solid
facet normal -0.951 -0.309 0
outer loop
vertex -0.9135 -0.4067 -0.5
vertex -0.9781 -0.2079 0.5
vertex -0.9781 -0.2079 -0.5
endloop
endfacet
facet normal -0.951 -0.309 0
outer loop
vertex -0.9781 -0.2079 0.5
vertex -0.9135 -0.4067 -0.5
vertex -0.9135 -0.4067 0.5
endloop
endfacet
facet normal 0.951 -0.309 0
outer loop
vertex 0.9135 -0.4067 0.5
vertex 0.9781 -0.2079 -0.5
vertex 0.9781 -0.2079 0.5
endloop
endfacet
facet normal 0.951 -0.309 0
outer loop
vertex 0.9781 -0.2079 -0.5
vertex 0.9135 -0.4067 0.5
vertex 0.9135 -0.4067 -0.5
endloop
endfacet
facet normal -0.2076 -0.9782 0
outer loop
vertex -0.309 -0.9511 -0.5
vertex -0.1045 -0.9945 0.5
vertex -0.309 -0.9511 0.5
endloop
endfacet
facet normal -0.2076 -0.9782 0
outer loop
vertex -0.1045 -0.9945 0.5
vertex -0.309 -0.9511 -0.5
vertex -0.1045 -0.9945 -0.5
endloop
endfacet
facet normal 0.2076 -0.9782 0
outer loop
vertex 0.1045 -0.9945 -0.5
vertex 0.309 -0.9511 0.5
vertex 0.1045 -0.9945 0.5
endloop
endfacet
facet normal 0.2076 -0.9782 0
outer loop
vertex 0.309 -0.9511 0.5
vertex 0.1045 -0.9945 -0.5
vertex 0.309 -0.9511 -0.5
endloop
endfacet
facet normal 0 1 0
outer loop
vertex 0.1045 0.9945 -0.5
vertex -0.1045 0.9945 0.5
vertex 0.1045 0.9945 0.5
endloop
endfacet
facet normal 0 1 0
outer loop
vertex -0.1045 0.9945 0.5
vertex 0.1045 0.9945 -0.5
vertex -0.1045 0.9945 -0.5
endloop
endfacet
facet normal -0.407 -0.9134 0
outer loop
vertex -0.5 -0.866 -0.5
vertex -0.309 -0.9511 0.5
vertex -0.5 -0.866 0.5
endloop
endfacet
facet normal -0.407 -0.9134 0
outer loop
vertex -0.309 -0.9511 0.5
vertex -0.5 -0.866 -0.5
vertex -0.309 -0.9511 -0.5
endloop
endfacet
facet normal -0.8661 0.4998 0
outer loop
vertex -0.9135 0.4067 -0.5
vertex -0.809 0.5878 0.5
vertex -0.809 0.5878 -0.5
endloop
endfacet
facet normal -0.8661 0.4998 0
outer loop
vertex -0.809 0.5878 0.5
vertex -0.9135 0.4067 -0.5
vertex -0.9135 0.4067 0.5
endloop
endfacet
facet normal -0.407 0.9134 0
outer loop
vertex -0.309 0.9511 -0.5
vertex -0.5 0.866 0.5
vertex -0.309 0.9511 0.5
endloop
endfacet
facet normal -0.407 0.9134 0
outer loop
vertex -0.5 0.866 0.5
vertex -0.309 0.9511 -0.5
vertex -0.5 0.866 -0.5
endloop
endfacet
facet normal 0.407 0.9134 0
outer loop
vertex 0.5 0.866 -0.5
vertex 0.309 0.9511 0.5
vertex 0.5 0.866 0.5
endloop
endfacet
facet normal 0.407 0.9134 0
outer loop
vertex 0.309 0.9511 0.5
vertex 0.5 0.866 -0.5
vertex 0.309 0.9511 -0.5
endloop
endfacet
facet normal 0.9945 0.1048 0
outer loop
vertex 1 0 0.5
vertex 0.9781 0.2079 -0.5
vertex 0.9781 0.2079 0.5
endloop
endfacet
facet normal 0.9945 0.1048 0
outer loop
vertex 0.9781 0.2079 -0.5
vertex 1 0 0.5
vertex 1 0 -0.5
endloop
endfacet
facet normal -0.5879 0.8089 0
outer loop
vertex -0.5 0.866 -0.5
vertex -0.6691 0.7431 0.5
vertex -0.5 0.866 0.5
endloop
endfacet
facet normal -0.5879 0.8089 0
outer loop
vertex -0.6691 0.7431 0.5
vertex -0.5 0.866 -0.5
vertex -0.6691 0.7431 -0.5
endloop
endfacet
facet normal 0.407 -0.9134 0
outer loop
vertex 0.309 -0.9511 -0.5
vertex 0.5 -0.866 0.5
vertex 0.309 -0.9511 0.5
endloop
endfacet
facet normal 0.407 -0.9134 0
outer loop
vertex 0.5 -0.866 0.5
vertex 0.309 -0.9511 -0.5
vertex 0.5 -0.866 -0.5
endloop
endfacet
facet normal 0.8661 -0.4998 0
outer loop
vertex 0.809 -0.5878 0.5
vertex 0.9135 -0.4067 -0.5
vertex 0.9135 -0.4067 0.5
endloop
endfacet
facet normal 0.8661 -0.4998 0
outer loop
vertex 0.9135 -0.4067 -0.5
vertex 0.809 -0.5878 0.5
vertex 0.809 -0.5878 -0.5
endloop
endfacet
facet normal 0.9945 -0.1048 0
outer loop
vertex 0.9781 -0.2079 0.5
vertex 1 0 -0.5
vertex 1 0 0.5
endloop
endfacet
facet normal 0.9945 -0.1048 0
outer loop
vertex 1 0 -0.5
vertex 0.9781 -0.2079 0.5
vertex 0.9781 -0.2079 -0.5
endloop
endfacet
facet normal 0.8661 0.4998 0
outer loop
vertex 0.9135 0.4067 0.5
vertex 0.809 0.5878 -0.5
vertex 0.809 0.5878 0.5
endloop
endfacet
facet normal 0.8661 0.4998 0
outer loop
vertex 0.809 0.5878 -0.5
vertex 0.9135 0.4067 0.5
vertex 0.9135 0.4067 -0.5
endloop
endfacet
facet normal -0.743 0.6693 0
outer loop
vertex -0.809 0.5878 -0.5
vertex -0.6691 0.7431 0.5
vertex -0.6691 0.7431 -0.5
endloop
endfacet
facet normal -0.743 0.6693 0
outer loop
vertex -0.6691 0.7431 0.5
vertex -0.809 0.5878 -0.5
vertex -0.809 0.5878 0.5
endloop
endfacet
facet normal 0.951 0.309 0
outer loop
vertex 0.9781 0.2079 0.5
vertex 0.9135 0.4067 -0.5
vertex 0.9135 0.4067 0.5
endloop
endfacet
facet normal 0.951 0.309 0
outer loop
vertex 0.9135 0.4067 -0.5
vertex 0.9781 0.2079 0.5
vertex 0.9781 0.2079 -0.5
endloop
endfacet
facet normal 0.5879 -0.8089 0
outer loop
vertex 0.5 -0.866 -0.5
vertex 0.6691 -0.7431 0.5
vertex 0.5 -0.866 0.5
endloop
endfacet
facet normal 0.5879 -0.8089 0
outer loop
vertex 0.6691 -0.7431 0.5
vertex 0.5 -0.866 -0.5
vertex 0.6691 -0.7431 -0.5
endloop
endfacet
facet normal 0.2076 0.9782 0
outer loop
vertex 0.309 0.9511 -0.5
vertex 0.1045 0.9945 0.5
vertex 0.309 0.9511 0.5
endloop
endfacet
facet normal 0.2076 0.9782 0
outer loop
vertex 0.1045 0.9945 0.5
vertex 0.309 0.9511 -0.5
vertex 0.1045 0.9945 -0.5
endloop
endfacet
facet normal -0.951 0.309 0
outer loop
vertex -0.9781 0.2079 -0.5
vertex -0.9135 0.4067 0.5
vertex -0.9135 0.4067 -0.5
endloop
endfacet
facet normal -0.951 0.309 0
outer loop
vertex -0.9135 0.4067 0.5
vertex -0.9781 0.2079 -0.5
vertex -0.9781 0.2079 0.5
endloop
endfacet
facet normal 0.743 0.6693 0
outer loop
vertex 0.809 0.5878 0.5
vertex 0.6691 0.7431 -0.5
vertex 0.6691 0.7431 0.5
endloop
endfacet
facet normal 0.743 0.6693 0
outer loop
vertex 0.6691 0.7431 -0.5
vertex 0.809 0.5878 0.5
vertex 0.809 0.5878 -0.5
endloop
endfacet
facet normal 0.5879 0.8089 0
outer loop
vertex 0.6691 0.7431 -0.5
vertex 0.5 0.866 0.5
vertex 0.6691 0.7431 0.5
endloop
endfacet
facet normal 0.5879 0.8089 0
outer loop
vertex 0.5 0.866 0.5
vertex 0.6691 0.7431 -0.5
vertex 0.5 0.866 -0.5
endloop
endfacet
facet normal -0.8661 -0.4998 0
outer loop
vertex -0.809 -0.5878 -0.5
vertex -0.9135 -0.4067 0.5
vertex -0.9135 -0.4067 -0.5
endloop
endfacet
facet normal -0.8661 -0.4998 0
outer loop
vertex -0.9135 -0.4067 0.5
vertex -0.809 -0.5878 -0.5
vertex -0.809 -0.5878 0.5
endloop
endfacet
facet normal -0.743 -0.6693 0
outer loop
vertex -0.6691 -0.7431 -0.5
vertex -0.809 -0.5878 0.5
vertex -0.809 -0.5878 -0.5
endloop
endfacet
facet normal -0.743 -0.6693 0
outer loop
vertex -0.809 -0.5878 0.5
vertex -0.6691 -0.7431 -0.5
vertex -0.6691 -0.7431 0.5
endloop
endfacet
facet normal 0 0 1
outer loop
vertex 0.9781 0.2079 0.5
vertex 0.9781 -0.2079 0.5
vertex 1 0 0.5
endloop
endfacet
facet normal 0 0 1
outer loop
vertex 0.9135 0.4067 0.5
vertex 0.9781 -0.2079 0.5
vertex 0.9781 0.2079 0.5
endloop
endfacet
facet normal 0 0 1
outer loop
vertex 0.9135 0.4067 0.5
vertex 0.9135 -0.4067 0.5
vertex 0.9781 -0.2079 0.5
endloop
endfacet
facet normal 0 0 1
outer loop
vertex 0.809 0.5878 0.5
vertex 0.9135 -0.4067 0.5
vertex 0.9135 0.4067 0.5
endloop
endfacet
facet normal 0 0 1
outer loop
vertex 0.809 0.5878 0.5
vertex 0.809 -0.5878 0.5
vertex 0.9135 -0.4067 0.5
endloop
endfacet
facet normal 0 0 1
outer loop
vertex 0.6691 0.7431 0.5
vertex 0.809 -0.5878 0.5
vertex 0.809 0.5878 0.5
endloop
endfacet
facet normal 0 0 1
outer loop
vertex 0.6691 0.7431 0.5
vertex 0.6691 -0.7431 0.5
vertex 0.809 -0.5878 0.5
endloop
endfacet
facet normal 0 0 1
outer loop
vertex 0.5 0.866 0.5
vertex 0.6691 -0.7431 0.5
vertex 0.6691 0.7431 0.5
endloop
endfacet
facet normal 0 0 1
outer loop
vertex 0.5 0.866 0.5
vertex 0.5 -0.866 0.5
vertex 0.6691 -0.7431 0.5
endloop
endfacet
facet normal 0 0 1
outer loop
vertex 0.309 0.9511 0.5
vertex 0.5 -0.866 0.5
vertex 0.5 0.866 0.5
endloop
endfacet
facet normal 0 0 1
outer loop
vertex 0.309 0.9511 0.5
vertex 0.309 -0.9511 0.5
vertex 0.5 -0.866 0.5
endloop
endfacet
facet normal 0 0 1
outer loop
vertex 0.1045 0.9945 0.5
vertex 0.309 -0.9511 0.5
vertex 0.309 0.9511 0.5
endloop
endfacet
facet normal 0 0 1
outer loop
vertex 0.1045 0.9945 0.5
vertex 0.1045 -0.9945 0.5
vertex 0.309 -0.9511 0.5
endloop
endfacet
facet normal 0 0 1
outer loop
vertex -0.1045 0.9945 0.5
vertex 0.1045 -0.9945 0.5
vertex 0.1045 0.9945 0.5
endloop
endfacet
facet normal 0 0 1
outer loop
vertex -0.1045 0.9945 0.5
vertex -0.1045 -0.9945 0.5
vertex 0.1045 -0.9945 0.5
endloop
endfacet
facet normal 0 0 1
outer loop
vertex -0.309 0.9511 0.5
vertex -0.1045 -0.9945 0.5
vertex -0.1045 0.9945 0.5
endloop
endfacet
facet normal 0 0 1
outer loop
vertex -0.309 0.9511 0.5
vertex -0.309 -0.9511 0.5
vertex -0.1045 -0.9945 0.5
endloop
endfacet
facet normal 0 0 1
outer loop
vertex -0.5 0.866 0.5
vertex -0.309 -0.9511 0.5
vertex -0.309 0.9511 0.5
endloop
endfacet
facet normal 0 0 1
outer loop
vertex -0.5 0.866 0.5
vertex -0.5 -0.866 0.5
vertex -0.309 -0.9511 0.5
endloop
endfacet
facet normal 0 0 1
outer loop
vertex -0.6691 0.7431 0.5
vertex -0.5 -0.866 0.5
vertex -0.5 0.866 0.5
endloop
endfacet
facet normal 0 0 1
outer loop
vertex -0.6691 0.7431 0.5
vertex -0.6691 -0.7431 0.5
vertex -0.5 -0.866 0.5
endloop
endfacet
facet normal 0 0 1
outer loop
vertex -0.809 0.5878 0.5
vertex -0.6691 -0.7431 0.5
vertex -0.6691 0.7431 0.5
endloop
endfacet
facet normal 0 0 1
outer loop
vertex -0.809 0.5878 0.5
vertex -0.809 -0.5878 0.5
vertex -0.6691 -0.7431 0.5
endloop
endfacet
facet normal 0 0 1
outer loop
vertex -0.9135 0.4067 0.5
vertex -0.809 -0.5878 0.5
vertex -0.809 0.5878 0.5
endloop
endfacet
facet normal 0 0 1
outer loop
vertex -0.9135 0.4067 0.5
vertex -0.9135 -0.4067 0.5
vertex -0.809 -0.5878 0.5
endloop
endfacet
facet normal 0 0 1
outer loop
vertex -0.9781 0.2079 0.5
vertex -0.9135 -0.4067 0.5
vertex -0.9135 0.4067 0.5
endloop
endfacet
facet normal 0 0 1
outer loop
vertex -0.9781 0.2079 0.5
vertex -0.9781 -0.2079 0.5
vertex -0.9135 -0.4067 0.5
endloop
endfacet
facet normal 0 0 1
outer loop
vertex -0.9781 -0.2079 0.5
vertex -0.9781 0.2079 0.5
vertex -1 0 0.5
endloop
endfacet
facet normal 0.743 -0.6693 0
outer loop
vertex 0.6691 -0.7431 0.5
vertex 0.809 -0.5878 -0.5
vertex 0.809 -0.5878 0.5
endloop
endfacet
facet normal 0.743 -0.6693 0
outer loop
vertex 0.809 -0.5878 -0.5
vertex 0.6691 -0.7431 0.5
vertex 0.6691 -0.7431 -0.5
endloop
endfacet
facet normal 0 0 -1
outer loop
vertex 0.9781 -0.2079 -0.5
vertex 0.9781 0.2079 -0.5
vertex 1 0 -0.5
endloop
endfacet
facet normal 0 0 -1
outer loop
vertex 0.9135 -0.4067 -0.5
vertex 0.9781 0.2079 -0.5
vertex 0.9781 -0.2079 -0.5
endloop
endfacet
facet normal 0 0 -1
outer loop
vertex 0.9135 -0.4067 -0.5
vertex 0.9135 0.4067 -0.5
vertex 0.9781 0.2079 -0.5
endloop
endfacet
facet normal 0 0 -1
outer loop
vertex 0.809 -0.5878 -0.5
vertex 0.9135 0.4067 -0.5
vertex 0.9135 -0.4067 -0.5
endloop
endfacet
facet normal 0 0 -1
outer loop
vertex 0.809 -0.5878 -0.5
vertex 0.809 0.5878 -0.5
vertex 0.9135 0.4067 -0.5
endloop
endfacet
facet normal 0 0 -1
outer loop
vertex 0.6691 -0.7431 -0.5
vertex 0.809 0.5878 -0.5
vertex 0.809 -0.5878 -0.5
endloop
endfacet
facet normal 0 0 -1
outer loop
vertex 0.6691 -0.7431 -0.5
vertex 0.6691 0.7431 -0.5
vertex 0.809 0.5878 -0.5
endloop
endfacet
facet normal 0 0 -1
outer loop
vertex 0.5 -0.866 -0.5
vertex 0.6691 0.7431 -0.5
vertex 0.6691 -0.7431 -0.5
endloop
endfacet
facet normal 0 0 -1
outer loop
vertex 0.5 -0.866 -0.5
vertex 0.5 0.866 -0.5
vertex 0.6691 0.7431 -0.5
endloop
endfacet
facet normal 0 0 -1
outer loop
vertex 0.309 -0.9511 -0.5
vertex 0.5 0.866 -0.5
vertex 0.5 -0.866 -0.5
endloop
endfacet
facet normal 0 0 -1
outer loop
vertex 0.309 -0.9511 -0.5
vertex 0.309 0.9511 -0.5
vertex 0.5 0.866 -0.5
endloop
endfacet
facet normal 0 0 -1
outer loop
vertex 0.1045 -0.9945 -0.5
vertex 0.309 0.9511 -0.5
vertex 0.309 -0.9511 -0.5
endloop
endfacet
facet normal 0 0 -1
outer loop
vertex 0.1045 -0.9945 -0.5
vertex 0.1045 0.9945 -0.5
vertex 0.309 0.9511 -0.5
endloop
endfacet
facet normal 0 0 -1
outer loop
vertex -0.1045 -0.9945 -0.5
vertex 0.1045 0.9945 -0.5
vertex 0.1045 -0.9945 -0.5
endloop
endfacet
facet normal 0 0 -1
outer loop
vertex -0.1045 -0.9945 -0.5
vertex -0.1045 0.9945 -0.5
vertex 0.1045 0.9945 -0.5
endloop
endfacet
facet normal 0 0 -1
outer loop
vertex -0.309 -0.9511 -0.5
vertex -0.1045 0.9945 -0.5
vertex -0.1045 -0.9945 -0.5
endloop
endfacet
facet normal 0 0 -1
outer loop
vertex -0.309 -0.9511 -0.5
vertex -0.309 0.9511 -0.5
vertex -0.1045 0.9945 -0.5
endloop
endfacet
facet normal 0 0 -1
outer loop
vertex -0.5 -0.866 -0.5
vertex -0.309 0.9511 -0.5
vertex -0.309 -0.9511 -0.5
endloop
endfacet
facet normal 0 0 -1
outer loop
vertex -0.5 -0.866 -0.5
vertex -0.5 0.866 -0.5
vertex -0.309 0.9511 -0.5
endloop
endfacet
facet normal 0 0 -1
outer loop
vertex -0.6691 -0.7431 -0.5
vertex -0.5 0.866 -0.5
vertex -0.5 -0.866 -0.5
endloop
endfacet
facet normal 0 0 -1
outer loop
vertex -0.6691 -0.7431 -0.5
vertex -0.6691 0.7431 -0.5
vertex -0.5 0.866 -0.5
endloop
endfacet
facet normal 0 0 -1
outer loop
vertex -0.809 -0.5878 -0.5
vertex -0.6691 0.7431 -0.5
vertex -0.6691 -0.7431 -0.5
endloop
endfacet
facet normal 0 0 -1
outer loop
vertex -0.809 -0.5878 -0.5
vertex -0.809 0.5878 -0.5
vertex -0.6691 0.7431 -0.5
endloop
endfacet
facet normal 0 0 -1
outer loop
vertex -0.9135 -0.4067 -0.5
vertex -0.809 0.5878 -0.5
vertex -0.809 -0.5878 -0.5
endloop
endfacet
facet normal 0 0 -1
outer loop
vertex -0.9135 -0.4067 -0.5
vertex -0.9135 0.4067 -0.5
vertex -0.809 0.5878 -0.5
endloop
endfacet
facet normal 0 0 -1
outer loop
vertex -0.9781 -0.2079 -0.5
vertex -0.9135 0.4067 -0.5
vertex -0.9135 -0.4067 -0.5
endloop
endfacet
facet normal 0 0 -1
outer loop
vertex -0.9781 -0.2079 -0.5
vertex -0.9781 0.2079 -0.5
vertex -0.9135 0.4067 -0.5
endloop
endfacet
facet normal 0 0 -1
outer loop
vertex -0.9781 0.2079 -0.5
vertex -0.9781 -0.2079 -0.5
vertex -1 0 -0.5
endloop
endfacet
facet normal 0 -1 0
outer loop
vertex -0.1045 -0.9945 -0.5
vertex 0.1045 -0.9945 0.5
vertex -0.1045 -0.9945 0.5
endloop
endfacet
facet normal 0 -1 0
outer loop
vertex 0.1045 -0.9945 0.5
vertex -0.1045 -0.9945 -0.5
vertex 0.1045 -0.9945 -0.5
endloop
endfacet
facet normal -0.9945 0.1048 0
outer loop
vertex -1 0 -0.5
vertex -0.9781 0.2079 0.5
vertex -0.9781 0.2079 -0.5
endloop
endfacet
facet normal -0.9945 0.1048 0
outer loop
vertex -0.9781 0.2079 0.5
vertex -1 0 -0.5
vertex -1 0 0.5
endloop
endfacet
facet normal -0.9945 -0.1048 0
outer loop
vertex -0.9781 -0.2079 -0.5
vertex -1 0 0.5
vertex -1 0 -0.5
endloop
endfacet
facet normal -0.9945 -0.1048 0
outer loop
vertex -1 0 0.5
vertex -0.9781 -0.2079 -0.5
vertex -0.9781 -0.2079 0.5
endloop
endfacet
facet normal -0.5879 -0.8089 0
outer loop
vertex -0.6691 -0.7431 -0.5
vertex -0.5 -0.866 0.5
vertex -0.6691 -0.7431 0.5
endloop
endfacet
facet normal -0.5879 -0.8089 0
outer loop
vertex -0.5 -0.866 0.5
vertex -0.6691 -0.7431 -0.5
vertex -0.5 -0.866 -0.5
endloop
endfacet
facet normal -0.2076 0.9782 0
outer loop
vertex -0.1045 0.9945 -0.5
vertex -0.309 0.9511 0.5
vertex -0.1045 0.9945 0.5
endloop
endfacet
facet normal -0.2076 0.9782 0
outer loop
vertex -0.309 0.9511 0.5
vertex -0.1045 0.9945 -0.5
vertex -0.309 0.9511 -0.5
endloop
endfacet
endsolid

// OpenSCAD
// file: IKEA Skadis v2 hook cutouts.scad
skadis_hook_width = 4.5;
skadis_hook_height = 46;
skadis_hole_spacing_width = 40; // middle to middle
cutout_tolerance_w = 0.4;
cutout_tolerance_h = 0.6;


module skadis_hook_cutout(center=false, hook_count=2) {
    
    if(center) {
        translate([-(skadis_hole_spacing_width + skadis_hook_width) / 2, 0, - skadis_hook_height / 2])
        object(hook_count);
    } else {
        object();
    }
    

}

module object(hook_count=2) {
    union() {

        // Cutout for the hook 1
        color("red")
        translate([- cutout_tolerance_w / 2, 0, - cutout_tolerance_h / 2])
        cube([skadis_hook_width + cutout_tolerance_w, 2, skadis_hook_height + cutout_tolerance_h]);

        // Cutout for the hook 2
        color("red")
        translate([- cutout_tolerance_w / 2 + skadis_hole_spacing_width, 0, - cutout_tolerance_h / 2])
        cube([skadis_hook_width + cutout_tolerance_w, 2, skadis_hook_height + cutout_tolerance_h]);

    }
}

skadis_hook_cutout(center = false);
// file: ../modules/roundedcube.scad
// More information: https://danielupshaw.com/openscad-rounded-corners/


// Examples
// color("Yellow")
// roundedcube(3, true, 0.7, "xmin");

// translate(v = [1, 0, 2])
// color("Pink")
// roundedcube([4, 2, 2], false, 0.6, "zmax");

// translate(v = [-4, -1, 2])
// color("Lightblue")
// roundedcube(2, false);

// translate(v = [0, 0, 6])
// color("Orange")
// roundedcube([3, 2, 2], true, 0.2);

// translate(v = [2.5, -0.5, 5])
// color("Green")
// roundedcube([3, 2, 2], false, 0.4, "z");

// Set to 0.01 for higher definition curves (renders slower)
$fs = 0.15;

module roundedcube(size = [1, 1, 1], center = false, radius = 0.5, apply_to = "all") {
	// If single value, convert to [x, y, z] vector
	size = (size[0] == undef) ? [size, size, size] : size;

	translate_min = radius;
	translate_xmax = size[0] - radius;
	translate_ymax = size[1] - radius;
	translate_zmax = size[2] - radius;

	diameter = radius * 2;

	obj_translate = (center == false) ?
		[0, 0, 0] : [
			-(size[0] / 2),
			-(size[1] / 2),
			-(size[2] / 2)
		];

	translate(v = obj_translate) {
		hull() {
			for (translate_x = [translate_min, translate_xmax]) {
				x_at = (translate_x == translate_min) ? "min" : "max";
				for (translate_y = [translate_min, translate_ymax]) {
					y_at = (translate_y == translate_min) ? "min" : "max";
					for (translate_z = [translate_min, translate_zmax]) {
						z_at = (translate_z == translate_min) ? "min" : "max";

						translate(v = [translate_x, translate_y, translate_z])
						if (
							(apply_to == "all") ||
							(apply_to == "xmin" && x_at == "min") || (apply_to == "xmax" && x_at == "max") ||
							(apply_to == "ymin" && y_at == "min") || (apply_to == "ymax" && y_at == "max") ||
							(apply_to == "zmin" && z_at == "min") || (apply_to == "zmax" && z_at == "max")
						) {
							sphere(r = radius);
						} else {
							rotate = 
								(apply_to == "xmin" || apply_to == "xmax" || apply_to == "x") ? [0, 90, 0] : (
								(apply_to == "ymin" || apply_to == "ymax" || apply_to == "y") ? [90, 90, 0] :
								[0, 0, 0]
							);
							rotate(a = rotate)
							cylinder(h = diameter, r = radius, center = true);
						}
					}
				}
			}
		}
	}
}
// file: IKEA Skadis v2 Bin.scad
_width = 37 + 1.6 + 1.6;
_depth = 18 + 1.6 + 1.6;
_height = 60;
_thickness = 1.6;  //Recommended minimum 1.6

//use <./IKEA Skadis include backwall with 3 hooks.scad>
use <../modules/roundedcube.scad>
use <./IKEA Skadis v2 hook cutouts.scad>



module bin(_w, _d, _h, _t, _r) {

    difference() {
        translate([0, _d / 2, 0])
        difference() {
            roundedcube(size = [_w, _d, _h], center = true, radius = _r, apply_to = "z");
            color("red")
            translate([0, 0, _t])
            roundedcube(size = [_w - _t * 2, _d - _t * 2, _h - _t * 2 + 1], center = true, radius = _r, apply_to = "z");
        }
        color("green")
        translate([0, -1.4, 0])
        skadis_hook_cutout(center=true, 3);
    }
}

bin(_width, _depth, _height, _thickness);
// main file
_width = 81;
_depth = 33;
_height = 70;
_thickness = 1.6; //Recommended minimum 1.6

_bottom_cutout = 1;
_bottom_cutout_width = 15;
_bottom_cutout_depth = 20;

_right_cutout = 0;
_right_cutout_depth = 13;
_right_cutout_height = 20;
_right_cutout_z_offset = 30; // (_height - _left_cutout_height) / 2
_right_cutout_y_offset = 20; // (_depth - _left_cutout_depth) / 2

_left_cutout = 0;
_left_cutout_depth = 13; //16
_left_cutout_height = 20;
_left_cutout_z_offset = 30; // (_height - _right_cutout_height) / 2
_left_cutout_y_offset = 20; // (_depth - _left_cutout_depth) / 2

_front_cutout = 1;
_front_cutout_width = 20;
_front_cutout_height = 30;
_front_cutout_z_offset = 14; // Middle = (_height - _front_cutout_height) / 2;

use <./IKEA Skadis v2 Bin.scad>
use <../modules/roundedcube.scad>

difference() {
    translate([_width / 2, 0, _height / 2])
    bin(_width, _depth, _height, _thickness);

    // Bottom cutout
    if(_bottom_cutout == 1) {
        translate([(_width - _bottom_cutout_width) / 2, (_depth - _bottom_cutout_depth) / 2, -1])
        //cube([_bottom_cutout_width, _bottom_cutout_depth, _thickness + 2]);
        roundedcube(size = [_bottom_cutout_width, _bottom_cutout_depth, _thickness + 2], center = false, radius = 5, apply_to = "z");
    }

    // Right cutout
    if(_right_cutout == 1) {
        translate([_width - _thickness - 1, _depth - _right_cutout_depth - _right_cutout_y_offset, _left_cutout_z_offset])
        roundedcube(size = [_thickness + 2, _right_cutout_depth, _right_cutout_height], center = false, radius = 2.5, apply_to = "x");
    }

    // Left cutout
    if(_left_cutout == 1) {
        translate([- 1, _depth - _left_cutout_depth - _left_cutout_y_offset, _left_cutout_z_offset])
        roundedcube(size = [_thickness + 2, _left_cutout_depth, _left_cutout_height], center = false, radius = 2.5, apply_to = "x");
    }

    // Front cutout
    if(_front_cutout == 1) {
        color("red")
        translate([(_width - _front_cutout_width) / 2, _depth -1, _front_cutout_z_offset])
        //cube([_bottom_cutout_width, _bottom_cutout_depth, _thickness + 2]);
        roundedcube(size = [_front_cutout_width, _thickness, _front_cutout_height], center = false, radius = 5, apply_to = "y");
    }
}

// color("pink")
// translate([3, 2, 2])
// cube([124, 39, 74]);
